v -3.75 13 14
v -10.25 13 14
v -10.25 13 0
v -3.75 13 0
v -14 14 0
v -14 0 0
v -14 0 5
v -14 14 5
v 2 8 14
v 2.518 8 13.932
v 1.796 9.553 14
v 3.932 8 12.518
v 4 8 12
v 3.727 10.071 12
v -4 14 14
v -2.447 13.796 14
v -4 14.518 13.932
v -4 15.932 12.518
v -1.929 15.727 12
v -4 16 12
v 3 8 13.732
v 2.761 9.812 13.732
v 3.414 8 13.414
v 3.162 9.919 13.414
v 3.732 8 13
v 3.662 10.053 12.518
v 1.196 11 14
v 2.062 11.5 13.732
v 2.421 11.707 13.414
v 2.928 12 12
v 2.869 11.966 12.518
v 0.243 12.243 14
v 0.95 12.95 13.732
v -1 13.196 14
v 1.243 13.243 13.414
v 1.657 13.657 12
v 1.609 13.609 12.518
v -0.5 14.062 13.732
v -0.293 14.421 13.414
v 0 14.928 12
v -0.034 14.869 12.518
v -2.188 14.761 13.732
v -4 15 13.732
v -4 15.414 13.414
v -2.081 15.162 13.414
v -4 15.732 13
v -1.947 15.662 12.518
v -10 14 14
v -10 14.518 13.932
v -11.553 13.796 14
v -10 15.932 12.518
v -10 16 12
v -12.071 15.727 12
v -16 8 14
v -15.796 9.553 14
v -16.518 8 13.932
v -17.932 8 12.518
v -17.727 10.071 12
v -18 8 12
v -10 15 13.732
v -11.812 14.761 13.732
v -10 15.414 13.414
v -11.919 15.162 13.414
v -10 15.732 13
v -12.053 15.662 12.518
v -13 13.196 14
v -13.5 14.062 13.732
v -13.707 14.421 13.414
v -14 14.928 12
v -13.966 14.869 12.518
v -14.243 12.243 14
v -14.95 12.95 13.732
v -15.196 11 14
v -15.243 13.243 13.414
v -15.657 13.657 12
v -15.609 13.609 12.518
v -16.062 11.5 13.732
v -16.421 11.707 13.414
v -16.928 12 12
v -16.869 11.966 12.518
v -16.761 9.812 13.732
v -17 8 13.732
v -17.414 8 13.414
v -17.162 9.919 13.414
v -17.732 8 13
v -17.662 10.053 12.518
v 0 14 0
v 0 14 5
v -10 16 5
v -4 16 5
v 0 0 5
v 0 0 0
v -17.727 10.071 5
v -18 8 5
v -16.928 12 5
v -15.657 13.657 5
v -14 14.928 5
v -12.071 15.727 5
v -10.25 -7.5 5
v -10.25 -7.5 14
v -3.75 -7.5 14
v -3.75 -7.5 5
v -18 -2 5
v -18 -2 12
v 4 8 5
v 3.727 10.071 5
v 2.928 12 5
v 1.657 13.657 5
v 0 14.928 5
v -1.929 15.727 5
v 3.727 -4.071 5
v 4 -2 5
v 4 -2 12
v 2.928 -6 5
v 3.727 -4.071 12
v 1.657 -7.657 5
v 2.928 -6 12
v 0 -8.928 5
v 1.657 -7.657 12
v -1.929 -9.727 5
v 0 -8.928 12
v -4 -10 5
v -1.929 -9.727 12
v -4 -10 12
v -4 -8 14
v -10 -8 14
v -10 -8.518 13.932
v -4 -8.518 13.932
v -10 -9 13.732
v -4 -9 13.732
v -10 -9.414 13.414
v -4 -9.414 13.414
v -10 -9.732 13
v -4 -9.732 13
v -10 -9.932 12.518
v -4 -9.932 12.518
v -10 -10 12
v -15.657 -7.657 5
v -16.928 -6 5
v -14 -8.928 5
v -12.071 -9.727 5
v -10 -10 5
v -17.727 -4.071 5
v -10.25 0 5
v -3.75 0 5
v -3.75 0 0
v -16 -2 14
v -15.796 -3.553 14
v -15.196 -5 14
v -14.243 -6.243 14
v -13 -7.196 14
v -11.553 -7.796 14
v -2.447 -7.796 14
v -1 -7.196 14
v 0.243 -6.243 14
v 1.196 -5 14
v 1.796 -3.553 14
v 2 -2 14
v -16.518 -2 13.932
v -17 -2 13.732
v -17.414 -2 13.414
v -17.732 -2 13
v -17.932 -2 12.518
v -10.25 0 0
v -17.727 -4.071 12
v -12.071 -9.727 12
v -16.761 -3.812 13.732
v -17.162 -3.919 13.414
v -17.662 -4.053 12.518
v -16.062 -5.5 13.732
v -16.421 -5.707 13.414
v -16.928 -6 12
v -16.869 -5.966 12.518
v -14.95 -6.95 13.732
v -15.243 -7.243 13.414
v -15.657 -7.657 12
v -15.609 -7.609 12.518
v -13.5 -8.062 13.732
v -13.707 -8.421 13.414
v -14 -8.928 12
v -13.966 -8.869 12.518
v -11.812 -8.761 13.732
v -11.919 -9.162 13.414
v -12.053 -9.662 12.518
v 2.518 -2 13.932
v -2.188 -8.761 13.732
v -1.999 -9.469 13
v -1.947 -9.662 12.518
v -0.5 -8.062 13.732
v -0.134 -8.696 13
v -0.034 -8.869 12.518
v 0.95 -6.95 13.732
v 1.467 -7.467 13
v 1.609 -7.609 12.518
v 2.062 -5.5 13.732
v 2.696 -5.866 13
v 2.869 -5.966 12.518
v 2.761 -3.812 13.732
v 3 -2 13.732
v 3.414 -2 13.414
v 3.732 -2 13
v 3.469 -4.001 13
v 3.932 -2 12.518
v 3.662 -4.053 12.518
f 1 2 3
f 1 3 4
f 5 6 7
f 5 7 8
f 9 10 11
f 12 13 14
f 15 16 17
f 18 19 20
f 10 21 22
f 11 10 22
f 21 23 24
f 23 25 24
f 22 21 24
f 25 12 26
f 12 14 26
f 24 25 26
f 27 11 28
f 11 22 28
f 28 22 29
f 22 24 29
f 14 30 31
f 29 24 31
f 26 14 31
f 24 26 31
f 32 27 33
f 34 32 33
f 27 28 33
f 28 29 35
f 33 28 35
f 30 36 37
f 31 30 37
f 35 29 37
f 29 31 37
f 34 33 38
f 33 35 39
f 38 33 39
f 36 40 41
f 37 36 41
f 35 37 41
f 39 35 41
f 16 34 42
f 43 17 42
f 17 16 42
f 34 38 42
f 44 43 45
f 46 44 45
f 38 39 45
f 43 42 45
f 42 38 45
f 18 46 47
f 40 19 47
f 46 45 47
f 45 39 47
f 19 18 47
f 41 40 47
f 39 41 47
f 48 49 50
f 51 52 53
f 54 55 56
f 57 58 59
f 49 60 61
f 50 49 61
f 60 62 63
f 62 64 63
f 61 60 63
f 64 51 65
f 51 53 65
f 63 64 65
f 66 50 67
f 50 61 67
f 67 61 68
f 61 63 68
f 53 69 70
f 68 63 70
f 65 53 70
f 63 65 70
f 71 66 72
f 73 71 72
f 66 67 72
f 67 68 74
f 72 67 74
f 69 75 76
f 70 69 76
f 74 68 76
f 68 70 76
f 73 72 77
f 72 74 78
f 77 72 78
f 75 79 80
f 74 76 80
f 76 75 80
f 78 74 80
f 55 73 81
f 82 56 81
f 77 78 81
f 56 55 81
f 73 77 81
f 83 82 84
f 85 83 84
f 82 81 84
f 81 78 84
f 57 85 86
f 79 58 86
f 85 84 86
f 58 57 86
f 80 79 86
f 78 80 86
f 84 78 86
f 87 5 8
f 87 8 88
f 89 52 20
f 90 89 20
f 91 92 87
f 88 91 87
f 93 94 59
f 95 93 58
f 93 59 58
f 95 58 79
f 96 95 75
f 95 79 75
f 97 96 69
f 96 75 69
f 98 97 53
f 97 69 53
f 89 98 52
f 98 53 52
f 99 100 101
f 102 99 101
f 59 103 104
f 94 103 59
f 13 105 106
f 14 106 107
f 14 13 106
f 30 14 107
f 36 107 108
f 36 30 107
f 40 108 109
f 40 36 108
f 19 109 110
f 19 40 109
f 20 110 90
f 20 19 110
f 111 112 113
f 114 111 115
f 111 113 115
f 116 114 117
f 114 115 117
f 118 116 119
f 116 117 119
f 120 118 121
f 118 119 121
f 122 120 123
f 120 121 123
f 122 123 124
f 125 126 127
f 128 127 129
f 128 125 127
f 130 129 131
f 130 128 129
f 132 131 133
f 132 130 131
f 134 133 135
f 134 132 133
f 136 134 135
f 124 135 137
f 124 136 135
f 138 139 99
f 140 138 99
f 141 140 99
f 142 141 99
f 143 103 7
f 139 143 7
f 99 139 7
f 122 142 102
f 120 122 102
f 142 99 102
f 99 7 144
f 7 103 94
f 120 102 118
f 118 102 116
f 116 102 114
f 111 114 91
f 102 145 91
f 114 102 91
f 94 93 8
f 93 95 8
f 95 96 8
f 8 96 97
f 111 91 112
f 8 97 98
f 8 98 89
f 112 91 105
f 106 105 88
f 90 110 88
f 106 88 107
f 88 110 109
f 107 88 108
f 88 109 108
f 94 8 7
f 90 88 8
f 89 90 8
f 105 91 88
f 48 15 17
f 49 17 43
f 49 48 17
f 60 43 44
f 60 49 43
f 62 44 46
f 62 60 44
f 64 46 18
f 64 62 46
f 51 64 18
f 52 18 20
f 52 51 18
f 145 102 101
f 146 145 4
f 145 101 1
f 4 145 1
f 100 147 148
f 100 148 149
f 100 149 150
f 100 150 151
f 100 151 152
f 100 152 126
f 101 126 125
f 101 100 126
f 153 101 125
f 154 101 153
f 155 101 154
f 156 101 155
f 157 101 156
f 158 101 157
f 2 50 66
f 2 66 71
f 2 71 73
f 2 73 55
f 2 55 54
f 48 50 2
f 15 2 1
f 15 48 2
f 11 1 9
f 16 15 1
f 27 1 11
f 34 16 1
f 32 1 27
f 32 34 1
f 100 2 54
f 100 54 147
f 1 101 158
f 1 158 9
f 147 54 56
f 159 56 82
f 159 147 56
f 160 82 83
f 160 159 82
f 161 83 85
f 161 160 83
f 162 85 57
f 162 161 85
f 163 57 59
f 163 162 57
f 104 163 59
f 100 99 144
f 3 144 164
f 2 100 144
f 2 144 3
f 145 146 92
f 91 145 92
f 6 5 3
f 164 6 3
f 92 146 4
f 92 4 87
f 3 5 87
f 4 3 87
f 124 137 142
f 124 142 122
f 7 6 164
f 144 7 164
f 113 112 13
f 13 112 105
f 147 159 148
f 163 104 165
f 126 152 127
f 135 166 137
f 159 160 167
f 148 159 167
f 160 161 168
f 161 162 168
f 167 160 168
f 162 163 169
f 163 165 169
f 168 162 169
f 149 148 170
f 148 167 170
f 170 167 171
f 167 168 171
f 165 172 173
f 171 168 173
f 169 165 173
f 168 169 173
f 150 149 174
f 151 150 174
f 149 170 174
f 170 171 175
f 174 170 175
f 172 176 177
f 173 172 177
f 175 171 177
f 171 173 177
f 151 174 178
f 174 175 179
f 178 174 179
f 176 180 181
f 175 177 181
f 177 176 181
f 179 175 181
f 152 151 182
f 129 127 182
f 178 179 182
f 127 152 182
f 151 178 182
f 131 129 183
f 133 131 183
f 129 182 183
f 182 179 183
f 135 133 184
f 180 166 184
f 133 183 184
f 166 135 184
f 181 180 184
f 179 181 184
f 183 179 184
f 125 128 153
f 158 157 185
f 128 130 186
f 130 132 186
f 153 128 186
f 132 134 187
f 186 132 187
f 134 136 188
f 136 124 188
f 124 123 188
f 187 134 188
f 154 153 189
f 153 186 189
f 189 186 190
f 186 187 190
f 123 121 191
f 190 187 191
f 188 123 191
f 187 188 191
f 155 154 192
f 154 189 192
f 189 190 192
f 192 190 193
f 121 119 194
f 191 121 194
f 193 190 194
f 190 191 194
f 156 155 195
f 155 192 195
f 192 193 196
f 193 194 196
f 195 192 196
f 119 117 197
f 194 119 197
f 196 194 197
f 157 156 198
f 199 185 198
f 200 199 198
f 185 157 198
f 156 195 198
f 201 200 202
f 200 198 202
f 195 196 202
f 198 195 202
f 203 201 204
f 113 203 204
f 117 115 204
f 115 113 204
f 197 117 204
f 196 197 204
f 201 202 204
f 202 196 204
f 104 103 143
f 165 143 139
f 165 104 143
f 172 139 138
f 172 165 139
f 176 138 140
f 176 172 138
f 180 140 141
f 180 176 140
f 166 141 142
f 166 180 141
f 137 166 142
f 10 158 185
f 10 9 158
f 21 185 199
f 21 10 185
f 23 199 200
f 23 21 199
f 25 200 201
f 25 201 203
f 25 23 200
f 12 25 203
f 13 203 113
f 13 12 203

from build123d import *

# Parameters (mm, degrees)
F0_W     = 14
F0_H     = 14
F1_DEPTH = 5
F2_W     = 22
F2_H     = 26
F2_W_2   = 14
F2_H_2   = 14
F3_DEPTH = 9
F4_W     = 6.5
F4_H     = 20.5
F5_DEPTH = 9
F6_W     = 6.5
F6_H     = 13
F7_DEPTH = 5.001
F8_R     = 8
F9_R     = 2


with BuildPart() as f1:
    # F0 (on Top) → F1 (new body)
    with BuildSketch(Plane.XY):
        with Locations((-7, 7)):
            Rectangle(F0_W, F0_H)
    extrude(amount=F1_DEPTH)

    # F2 (on face) → F3 (join)
    with BuildSketch(Plane.XY.offset(5)):
        with Locations((-7, 3)):
            Rectangle(F2_W, F2_H)
        with Locations((-7, 7)):
            Rectangle(F2_W_2, F2_H_2, mode=Mode.SUBTRACT)
        with Locations((-7, 7)):
            Rectangle(F2_W_2, F2_H_2)
    extrude(amount=F3_DEPTH)

    # F4 (on face) → F5 (cut, through all)
    with BuildSketch(Plane.XY.offset(14)):
        with Locations((-7, 2.75)):
            Rectangle(F4_W, F4_H)
    extrude(amount=-F5_DEPTH, mode=Mode.SUBTRACT)

    # F6 (on face) → F7 (cut, through all)
    with BuildSketch(Plane.XY.offset(5)):
        with Locations((-7, 6.5)):
            Rectangle(F6_W, F6_H)
    extrude(amount=-F7_DEPTH, mode=Mode.SUBTRACT)

    # F8
    f8_edges = [f1.edges().sort_by_distance(p)[0] for p in [
        (4, -10, 9.5),
        (4, 16, 9.5),
        (-18, 16, 9.5),
        (-18, -10, 9.5),
    ]]
    fillet(f8_edges, radius=F8_R)

    # F9
    f9_edges = [f1.edges().sort_by_distance(p)[0] for p in [
        (4, 3, 14),
        (1.656854, 13.656854, 14),
    ]]
    fillet(f9_edges, radius=F9_R)


solid = f1.part
